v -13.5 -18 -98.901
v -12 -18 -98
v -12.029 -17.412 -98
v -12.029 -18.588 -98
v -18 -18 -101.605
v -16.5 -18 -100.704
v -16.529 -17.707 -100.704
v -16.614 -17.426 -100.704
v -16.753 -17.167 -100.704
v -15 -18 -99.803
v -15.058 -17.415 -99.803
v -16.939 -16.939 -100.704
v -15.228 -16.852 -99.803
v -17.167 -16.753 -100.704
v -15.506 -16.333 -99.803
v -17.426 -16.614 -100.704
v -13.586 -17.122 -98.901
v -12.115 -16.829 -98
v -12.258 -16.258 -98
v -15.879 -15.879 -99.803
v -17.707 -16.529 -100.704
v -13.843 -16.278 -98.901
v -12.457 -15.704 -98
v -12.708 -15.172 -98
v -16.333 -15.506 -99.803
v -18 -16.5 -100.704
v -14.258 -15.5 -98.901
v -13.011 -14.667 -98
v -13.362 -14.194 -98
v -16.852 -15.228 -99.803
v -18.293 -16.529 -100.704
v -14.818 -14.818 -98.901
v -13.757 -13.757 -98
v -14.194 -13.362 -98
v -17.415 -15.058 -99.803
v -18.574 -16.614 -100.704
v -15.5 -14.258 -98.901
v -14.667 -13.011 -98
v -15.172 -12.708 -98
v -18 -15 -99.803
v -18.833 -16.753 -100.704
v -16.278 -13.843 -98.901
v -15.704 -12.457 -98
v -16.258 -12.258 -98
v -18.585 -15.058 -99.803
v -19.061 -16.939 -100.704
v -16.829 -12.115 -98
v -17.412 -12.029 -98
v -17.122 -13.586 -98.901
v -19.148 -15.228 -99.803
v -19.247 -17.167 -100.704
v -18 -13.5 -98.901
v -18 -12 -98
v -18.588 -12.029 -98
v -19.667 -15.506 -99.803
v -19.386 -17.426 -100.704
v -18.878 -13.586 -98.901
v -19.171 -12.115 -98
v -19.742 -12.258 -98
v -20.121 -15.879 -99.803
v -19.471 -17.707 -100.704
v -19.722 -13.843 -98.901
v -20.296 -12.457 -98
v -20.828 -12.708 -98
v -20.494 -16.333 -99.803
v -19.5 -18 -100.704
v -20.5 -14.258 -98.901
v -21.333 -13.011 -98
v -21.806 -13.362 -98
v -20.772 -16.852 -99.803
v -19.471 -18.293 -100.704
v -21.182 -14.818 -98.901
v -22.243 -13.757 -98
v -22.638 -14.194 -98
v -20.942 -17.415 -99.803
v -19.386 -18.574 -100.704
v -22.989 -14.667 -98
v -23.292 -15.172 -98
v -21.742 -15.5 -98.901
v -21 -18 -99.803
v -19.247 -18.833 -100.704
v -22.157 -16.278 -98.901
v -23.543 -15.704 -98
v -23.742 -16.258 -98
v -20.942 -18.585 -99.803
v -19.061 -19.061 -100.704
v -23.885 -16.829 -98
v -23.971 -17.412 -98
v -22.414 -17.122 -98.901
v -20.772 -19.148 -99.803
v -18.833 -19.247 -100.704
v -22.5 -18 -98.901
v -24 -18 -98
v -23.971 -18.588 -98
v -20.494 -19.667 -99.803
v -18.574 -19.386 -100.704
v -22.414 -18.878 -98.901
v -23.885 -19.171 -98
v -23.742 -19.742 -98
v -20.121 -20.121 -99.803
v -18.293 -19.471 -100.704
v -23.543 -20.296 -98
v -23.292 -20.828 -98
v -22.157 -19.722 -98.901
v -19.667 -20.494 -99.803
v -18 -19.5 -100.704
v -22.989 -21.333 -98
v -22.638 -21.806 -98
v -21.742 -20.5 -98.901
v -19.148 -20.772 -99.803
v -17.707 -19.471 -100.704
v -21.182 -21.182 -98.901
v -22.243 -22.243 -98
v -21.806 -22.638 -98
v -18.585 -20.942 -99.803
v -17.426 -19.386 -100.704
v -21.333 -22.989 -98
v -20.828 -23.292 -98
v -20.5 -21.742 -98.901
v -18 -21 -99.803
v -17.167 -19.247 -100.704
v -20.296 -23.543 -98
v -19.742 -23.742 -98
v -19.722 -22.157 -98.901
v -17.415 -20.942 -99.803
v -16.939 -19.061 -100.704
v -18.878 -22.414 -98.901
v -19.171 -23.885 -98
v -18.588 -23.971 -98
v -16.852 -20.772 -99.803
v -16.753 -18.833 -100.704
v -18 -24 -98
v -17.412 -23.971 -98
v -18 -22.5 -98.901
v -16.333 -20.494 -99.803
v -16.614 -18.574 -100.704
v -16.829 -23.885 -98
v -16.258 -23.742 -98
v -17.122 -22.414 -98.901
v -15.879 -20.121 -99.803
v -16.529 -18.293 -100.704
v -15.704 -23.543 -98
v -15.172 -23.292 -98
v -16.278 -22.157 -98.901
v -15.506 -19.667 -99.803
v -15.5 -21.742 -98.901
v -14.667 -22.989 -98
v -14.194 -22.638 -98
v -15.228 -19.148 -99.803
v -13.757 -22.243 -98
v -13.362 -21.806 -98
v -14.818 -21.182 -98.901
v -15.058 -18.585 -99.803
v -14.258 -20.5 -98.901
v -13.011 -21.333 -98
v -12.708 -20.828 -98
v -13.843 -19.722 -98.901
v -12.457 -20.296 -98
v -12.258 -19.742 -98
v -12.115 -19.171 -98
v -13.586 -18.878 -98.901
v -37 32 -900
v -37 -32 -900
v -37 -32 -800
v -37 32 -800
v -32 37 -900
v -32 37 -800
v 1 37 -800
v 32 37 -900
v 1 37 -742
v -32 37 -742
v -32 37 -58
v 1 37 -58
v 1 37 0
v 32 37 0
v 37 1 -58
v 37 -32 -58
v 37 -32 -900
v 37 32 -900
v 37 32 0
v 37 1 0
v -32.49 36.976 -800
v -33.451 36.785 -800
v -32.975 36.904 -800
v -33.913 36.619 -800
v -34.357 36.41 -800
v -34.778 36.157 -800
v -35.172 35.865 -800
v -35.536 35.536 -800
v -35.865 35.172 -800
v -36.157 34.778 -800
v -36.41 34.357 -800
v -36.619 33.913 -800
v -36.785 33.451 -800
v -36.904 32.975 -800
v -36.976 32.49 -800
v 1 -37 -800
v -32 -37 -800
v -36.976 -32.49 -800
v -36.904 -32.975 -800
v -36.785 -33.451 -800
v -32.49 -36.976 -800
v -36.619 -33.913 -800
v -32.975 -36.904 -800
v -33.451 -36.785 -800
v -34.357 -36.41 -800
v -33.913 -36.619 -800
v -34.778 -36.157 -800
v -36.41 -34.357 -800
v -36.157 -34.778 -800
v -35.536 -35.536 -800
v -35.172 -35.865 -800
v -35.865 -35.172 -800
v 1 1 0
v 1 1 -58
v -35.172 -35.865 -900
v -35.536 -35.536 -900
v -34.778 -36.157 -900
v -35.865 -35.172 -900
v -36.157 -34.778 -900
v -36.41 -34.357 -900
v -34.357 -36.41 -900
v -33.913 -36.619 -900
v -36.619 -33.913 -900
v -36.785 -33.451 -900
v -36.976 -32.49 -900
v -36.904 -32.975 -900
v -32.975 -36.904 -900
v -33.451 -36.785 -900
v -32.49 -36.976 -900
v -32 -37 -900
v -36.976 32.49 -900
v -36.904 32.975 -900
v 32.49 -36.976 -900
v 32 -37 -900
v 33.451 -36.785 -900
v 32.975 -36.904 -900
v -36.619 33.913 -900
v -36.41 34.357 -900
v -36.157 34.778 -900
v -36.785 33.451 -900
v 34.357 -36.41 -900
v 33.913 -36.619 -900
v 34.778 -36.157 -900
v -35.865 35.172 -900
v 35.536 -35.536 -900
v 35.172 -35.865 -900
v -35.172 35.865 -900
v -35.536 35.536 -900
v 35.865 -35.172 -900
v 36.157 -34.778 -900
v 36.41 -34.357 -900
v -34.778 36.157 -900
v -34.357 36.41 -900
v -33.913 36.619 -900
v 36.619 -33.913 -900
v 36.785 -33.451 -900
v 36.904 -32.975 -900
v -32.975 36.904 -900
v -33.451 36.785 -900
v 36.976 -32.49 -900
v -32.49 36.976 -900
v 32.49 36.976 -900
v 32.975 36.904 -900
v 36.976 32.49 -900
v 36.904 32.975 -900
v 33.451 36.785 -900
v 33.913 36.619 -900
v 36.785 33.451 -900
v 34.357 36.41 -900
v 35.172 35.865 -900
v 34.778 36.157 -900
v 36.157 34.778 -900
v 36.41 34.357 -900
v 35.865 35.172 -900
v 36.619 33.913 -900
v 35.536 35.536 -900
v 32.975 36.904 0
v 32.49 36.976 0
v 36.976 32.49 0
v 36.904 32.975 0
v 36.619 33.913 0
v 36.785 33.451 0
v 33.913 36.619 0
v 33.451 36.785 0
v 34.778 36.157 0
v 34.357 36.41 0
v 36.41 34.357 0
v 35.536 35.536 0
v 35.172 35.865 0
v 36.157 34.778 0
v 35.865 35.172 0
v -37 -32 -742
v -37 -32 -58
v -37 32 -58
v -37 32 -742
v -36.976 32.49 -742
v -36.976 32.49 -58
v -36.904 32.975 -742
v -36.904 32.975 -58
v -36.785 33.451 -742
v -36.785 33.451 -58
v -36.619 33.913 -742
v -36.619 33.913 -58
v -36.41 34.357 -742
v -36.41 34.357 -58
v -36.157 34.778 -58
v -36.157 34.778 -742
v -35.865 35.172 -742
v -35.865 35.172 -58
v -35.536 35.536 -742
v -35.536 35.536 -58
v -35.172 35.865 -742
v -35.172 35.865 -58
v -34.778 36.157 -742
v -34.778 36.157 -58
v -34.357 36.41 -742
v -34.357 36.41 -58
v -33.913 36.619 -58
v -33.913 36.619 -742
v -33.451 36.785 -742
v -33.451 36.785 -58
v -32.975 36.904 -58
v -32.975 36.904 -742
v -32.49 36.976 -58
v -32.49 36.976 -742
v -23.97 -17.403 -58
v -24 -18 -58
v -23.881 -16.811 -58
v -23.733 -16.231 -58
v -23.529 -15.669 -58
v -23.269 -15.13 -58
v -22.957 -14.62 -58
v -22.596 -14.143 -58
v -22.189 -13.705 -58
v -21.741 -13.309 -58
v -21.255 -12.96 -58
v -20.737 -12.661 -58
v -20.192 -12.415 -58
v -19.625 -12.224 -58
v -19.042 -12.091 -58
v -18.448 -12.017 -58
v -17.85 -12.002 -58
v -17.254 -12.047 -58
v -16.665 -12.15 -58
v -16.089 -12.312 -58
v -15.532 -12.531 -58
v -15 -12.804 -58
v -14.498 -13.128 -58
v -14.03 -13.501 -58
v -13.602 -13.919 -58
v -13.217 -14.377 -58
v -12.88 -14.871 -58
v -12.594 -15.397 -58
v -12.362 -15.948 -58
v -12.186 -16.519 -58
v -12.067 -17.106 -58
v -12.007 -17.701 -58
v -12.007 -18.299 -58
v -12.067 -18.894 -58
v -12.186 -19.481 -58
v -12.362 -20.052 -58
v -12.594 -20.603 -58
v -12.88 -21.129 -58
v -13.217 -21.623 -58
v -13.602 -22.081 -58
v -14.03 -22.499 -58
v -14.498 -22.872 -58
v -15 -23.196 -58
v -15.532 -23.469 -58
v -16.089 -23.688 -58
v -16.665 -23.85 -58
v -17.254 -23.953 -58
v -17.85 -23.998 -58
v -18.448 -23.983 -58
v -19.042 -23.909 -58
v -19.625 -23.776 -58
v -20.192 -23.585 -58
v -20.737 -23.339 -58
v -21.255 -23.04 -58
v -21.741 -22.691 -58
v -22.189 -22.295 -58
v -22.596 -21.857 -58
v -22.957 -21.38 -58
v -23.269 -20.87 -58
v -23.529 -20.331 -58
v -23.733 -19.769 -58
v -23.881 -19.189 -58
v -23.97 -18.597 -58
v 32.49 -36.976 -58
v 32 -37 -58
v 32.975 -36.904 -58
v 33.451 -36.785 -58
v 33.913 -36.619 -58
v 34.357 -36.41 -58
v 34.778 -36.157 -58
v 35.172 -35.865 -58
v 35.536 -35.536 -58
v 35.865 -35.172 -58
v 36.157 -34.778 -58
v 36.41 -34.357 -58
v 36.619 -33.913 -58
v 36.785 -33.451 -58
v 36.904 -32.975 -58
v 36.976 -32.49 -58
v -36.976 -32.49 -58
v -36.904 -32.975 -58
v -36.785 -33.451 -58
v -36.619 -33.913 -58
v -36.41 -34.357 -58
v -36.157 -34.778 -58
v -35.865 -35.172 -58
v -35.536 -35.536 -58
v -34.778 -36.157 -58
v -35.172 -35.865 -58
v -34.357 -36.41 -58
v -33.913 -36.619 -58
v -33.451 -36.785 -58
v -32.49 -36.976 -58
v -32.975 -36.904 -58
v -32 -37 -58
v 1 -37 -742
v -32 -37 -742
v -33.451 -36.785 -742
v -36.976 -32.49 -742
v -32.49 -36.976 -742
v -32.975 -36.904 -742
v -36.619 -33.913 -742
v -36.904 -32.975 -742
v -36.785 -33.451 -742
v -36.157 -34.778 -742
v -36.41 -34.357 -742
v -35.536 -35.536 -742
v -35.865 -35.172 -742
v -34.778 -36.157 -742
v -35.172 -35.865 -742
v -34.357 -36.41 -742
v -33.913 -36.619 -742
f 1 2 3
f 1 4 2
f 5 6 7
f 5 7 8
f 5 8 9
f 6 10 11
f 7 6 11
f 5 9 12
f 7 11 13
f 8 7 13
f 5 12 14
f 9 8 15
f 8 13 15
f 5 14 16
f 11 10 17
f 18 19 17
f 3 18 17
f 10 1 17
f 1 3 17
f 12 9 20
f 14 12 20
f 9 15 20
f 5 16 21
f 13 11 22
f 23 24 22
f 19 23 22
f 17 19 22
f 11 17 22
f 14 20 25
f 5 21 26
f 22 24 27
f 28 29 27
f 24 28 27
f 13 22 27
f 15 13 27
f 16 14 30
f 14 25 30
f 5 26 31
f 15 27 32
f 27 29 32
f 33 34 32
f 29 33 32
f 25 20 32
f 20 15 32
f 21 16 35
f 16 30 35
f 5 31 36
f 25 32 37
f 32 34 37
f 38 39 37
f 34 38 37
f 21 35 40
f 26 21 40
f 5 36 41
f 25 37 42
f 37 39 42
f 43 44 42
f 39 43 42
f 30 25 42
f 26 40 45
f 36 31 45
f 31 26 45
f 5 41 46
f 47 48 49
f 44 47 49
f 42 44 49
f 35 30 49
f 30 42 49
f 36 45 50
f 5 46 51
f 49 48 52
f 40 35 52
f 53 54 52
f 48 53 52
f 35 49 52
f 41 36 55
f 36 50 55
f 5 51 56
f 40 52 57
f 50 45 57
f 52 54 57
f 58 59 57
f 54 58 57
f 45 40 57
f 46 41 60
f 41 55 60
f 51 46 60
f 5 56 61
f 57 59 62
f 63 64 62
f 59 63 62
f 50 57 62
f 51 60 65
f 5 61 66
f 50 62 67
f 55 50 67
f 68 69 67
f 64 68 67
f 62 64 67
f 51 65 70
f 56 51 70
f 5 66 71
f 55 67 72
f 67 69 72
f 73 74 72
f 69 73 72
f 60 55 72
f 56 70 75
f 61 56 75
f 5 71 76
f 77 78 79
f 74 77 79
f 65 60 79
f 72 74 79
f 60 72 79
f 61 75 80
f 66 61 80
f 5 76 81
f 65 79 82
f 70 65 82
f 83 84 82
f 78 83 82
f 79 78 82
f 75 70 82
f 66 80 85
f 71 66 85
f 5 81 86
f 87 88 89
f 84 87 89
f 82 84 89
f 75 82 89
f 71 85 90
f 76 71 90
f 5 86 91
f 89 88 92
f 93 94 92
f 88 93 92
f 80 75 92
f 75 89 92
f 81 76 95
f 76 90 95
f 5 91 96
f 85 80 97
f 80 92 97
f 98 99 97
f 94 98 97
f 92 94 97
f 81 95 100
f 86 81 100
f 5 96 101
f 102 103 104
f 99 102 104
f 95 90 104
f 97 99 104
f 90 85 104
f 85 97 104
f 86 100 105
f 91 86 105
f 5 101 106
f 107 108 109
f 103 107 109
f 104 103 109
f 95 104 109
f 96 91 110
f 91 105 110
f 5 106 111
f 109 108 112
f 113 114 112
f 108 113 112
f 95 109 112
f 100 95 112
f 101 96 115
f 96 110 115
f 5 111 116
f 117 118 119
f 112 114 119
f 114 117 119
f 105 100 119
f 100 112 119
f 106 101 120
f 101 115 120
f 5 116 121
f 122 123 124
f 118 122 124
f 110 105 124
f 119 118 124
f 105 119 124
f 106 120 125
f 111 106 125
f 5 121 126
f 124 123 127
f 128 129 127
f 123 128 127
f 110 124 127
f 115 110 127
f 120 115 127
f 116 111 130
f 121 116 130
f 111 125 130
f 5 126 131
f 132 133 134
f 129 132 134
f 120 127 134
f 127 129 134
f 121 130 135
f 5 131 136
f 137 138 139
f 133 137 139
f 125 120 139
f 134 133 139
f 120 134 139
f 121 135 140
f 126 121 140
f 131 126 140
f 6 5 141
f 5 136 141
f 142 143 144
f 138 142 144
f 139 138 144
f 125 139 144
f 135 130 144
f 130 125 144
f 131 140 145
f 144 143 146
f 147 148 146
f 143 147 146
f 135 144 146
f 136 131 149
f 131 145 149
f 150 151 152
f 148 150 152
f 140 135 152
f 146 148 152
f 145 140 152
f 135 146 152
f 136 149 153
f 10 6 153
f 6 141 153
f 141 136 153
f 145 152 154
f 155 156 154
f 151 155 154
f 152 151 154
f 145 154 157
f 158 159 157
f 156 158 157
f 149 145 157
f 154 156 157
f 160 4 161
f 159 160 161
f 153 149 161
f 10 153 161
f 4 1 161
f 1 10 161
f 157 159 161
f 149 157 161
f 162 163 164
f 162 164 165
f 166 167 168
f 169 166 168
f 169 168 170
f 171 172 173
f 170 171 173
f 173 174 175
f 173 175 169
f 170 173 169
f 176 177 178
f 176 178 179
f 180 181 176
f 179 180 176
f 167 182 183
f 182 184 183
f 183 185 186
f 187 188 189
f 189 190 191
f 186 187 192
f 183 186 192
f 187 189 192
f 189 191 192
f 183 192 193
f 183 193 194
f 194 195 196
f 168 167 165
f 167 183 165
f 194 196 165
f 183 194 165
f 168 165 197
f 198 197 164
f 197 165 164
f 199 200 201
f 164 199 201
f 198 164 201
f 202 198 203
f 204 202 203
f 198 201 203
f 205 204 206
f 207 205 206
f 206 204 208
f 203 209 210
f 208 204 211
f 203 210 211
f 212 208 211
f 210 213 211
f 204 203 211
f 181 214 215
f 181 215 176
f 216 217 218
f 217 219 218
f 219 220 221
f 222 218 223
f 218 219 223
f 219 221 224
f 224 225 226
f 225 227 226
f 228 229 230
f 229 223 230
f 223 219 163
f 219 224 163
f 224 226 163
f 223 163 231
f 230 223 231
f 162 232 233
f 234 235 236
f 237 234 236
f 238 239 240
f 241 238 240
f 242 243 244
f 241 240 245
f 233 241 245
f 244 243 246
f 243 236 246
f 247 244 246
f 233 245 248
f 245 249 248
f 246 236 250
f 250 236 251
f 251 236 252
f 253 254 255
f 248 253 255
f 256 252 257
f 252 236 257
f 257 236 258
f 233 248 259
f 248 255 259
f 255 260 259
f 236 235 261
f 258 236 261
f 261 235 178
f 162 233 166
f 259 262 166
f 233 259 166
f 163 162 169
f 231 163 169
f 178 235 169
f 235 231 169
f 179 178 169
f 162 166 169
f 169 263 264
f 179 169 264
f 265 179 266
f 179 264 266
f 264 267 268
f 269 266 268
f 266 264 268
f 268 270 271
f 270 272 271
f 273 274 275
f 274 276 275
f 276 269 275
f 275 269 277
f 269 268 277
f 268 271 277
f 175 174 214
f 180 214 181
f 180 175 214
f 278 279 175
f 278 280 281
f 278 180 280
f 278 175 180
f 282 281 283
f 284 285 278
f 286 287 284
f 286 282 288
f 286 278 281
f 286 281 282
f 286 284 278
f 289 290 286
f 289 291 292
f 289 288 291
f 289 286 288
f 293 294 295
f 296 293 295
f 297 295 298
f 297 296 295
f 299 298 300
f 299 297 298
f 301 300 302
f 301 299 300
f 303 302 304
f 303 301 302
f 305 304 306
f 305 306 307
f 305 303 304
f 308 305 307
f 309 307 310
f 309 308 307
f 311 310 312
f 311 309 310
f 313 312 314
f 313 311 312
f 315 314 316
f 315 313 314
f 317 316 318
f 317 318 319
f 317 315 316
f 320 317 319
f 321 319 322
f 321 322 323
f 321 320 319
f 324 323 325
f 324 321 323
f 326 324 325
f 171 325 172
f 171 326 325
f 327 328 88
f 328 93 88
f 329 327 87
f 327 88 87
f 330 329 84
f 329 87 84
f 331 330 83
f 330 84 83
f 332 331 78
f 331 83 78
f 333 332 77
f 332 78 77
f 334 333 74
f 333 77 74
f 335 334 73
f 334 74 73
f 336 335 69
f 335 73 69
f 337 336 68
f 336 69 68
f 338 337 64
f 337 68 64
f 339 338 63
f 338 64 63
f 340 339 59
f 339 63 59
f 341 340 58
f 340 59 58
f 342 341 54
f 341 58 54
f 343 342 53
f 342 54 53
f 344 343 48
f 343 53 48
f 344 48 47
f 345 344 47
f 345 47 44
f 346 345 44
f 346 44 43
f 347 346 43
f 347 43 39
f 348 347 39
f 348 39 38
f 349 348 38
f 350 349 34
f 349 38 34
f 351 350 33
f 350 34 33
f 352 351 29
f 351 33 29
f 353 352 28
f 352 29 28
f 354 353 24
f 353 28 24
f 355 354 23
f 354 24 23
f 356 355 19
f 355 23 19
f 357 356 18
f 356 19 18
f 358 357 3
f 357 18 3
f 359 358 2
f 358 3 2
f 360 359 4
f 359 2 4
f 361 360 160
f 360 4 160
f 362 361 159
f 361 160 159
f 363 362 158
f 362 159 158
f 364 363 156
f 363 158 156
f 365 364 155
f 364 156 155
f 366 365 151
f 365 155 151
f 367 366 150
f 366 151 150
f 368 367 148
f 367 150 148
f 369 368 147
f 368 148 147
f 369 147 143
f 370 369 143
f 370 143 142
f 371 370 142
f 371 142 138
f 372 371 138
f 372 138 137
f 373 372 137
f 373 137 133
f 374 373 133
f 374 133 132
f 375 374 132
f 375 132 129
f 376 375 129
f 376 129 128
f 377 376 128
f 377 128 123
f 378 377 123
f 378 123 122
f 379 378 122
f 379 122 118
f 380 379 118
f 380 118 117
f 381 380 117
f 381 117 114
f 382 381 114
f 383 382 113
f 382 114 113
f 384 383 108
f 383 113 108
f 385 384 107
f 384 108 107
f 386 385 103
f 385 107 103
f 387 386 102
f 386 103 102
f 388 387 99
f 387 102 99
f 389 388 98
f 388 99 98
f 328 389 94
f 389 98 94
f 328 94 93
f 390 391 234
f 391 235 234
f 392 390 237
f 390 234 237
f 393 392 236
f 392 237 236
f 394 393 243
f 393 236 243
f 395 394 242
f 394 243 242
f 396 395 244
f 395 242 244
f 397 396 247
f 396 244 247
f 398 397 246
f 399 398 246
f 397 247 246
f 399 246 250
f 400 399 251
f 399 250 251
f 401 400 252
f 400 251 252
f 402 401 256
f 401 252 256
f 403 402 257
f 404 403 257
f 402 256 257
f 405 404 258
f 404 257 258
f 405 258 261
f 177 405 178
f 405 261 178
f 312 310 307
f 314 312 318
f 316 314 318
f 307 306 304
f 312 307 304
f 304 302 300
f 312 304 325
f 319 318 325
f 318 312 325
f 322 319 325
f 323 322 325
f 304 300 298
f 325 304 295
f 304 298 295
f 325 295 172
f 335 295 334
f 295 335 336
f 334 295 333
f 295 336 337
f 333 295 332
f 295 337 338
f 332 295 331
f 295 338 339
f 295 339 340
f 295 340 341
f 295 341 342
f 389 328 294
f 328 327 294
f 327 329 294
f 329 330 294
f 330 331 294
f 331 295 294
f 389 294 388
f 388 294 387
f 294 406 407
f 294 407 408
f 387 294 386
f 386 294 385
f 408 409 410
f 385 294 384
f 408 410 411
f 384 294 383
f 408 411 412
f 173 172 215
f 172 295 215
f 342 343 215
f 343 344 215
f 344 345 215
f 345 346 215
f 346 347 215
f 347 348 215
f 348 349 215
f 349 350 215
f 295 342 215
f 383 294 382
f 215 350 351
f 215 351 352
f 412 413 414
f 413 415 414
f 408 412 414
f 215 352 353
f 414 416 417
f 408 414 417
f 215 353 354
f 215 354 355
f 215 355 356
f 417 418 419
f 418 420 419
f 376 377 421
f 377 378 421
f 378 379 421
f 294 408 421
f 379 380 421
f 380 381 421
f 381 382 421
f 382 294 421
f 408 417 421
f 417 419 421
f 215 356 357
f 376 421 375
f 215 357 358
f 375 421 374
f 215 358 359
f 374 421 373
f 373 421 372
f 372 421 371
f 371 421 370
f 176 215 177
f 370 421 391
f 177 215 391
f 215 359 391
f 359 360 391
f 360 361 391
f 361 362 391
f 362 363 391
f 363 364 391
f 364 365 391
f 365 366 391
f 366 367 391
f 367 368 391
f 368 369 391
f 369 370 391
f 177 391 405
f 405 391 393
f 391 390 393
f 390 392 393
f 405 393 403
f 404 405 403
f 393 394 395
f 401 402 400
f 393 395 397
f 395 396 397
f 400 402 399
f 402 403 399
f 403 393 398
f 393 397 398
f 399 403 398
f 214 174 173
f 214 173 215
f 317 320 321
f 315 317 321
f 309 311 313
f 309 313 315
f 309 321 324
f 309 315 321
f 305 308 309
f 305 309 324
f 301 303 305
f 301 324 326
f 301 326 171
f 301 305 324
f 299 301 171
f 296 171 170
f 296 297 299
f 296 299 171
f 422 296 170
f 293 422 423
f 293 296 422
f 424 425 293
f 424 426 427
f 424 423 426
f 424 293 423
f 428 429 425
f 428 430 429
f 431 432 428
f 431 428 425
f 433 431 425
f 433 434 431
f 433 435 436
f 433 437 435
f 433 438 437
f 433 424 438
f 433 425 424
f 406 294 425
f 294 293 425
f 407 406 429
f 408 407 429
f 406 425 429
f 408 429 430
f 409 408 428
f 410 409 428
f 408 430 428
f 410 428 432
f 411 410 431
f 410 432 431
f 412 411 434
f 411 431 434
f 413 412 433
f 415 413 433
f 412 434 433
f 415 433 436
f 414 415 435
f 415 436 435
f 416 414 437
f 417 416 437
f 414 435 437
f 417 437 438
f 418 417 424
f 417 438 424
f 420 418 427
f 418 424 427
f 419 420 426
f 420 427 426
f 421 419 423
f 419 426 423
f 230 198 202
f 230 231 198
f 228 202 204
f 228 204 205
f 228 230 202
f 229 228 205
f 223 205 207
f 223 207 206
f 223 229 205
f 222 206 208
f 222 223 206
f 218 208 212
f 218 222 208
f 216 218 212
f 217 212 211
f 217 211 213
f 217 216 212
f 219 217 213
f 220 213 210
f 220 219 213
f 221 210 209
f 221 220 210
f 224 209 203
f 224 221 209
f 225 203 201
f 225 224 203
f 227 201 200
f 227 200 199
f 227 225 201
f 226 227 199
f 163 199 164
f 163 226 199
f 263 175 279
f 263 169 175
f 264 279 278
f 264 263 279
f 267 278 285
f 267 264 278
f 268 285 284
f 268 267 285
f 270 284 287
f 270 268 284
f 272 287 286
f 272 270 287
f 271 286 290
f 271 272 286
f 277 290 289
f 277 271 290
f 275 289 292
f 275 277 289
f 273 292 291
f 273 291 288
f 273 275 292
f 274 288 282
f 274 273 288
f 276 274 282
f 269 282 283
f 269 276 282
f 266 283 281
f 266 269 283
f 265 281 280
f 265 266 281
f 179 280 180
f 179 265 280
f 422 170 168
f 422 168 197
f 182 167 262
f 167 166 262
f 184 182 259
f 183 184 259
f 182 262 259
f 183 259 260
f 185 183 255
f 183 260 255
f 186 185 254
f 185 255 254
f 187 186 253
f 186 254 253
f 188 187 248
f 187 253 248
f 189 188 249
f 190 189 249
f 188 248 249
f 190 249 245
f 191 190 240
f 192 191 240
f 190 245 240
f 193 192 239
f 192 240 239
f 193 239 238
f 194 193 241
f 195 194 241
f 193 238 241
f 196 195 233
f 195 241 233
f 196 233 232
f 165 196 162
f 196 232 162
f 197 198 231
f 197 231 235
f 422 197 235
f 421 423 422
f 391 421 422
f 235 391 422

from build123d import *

# Parameters (mm, degrees)
F0_W     = 74
F0_H     = 74
F1_DEPTH = 900
F2_W     = 74
F2_H     = 58
F4_DEPTH = 38
F3_W     = 74
F3_H     = 58
F5_DEPTH = 38
F7_D     = 12
F7_DEPTH = 40
F7_TIP   = 3.6051637142
F8_W     = 74
F8_H     = 58
F9_DEPTH = 38
F10_R    = 5


with BuildPart() as f1:
    # F0 (on Top) → F1 (new body)
    with BuildSketch(Plane.XY):
        Rectangle(F0_W, F0_H)
    extrude(amount=-F1_DEPTH)

    # F2 (on face) → F4 (cut)
    with BuildSketch(Plane.XZ.offset(37)):
        with Locations((0, -29)):
            Rectangle(F2_W, F2_H)
    extrude(amount=-F4_DEPTH, mode=Mode.SUBTRACT)

    # F3 (on face) → F5 (cut)
    with BuildSketch(Plane(origin=(-37, 0, 0), x_dir=(0, -1, 0), z_dir=(-1, 0, 0))):
        with Locations((0, -29)):
            Rectangle(F3_W, F3_H)
    extrude(amount=-F5_DEPTH, mode=Mode.SUBTRACT)

    # F7
    with Locations(Plane.XY.offset(-58)):
        with Locations((-18, -18)):
            Hole(F7_D / 2, depth=F7_DEPTH)
            with Locations((0, 0, -(F7_DEPTH + F7_TIP / 2))):  # 118° drill point
                Cone(0, F7_D / 2, F7_TIP, mode=Mode.SUBTRACT)

    # F8 (on face) → F9 (cut)
    with BuildSketch(Plane(origin=(-37, 0, 0), x_dir=(0, -1, 0), z_dir=(-1, 0, 0))):
        with Locations((0, -771)):
            Rectangle(F8_W, F8_H)
    extrude(amount=-F9_DEPTH, mode=Mode.SUBTRACT)

    # F10
    f10_edges = [f1.edges().sort_by_distance(p)[0] for p in [
        (-37, -37, -850),
        (-37, -37, -400),
        (-37, 37, -400),
        (-37, 37, -850),
        (37, -37, -479),
        (37, 37, -450),
    ]]
    fillet(f10_edges, radius=F10_R)


solid = f1.part
